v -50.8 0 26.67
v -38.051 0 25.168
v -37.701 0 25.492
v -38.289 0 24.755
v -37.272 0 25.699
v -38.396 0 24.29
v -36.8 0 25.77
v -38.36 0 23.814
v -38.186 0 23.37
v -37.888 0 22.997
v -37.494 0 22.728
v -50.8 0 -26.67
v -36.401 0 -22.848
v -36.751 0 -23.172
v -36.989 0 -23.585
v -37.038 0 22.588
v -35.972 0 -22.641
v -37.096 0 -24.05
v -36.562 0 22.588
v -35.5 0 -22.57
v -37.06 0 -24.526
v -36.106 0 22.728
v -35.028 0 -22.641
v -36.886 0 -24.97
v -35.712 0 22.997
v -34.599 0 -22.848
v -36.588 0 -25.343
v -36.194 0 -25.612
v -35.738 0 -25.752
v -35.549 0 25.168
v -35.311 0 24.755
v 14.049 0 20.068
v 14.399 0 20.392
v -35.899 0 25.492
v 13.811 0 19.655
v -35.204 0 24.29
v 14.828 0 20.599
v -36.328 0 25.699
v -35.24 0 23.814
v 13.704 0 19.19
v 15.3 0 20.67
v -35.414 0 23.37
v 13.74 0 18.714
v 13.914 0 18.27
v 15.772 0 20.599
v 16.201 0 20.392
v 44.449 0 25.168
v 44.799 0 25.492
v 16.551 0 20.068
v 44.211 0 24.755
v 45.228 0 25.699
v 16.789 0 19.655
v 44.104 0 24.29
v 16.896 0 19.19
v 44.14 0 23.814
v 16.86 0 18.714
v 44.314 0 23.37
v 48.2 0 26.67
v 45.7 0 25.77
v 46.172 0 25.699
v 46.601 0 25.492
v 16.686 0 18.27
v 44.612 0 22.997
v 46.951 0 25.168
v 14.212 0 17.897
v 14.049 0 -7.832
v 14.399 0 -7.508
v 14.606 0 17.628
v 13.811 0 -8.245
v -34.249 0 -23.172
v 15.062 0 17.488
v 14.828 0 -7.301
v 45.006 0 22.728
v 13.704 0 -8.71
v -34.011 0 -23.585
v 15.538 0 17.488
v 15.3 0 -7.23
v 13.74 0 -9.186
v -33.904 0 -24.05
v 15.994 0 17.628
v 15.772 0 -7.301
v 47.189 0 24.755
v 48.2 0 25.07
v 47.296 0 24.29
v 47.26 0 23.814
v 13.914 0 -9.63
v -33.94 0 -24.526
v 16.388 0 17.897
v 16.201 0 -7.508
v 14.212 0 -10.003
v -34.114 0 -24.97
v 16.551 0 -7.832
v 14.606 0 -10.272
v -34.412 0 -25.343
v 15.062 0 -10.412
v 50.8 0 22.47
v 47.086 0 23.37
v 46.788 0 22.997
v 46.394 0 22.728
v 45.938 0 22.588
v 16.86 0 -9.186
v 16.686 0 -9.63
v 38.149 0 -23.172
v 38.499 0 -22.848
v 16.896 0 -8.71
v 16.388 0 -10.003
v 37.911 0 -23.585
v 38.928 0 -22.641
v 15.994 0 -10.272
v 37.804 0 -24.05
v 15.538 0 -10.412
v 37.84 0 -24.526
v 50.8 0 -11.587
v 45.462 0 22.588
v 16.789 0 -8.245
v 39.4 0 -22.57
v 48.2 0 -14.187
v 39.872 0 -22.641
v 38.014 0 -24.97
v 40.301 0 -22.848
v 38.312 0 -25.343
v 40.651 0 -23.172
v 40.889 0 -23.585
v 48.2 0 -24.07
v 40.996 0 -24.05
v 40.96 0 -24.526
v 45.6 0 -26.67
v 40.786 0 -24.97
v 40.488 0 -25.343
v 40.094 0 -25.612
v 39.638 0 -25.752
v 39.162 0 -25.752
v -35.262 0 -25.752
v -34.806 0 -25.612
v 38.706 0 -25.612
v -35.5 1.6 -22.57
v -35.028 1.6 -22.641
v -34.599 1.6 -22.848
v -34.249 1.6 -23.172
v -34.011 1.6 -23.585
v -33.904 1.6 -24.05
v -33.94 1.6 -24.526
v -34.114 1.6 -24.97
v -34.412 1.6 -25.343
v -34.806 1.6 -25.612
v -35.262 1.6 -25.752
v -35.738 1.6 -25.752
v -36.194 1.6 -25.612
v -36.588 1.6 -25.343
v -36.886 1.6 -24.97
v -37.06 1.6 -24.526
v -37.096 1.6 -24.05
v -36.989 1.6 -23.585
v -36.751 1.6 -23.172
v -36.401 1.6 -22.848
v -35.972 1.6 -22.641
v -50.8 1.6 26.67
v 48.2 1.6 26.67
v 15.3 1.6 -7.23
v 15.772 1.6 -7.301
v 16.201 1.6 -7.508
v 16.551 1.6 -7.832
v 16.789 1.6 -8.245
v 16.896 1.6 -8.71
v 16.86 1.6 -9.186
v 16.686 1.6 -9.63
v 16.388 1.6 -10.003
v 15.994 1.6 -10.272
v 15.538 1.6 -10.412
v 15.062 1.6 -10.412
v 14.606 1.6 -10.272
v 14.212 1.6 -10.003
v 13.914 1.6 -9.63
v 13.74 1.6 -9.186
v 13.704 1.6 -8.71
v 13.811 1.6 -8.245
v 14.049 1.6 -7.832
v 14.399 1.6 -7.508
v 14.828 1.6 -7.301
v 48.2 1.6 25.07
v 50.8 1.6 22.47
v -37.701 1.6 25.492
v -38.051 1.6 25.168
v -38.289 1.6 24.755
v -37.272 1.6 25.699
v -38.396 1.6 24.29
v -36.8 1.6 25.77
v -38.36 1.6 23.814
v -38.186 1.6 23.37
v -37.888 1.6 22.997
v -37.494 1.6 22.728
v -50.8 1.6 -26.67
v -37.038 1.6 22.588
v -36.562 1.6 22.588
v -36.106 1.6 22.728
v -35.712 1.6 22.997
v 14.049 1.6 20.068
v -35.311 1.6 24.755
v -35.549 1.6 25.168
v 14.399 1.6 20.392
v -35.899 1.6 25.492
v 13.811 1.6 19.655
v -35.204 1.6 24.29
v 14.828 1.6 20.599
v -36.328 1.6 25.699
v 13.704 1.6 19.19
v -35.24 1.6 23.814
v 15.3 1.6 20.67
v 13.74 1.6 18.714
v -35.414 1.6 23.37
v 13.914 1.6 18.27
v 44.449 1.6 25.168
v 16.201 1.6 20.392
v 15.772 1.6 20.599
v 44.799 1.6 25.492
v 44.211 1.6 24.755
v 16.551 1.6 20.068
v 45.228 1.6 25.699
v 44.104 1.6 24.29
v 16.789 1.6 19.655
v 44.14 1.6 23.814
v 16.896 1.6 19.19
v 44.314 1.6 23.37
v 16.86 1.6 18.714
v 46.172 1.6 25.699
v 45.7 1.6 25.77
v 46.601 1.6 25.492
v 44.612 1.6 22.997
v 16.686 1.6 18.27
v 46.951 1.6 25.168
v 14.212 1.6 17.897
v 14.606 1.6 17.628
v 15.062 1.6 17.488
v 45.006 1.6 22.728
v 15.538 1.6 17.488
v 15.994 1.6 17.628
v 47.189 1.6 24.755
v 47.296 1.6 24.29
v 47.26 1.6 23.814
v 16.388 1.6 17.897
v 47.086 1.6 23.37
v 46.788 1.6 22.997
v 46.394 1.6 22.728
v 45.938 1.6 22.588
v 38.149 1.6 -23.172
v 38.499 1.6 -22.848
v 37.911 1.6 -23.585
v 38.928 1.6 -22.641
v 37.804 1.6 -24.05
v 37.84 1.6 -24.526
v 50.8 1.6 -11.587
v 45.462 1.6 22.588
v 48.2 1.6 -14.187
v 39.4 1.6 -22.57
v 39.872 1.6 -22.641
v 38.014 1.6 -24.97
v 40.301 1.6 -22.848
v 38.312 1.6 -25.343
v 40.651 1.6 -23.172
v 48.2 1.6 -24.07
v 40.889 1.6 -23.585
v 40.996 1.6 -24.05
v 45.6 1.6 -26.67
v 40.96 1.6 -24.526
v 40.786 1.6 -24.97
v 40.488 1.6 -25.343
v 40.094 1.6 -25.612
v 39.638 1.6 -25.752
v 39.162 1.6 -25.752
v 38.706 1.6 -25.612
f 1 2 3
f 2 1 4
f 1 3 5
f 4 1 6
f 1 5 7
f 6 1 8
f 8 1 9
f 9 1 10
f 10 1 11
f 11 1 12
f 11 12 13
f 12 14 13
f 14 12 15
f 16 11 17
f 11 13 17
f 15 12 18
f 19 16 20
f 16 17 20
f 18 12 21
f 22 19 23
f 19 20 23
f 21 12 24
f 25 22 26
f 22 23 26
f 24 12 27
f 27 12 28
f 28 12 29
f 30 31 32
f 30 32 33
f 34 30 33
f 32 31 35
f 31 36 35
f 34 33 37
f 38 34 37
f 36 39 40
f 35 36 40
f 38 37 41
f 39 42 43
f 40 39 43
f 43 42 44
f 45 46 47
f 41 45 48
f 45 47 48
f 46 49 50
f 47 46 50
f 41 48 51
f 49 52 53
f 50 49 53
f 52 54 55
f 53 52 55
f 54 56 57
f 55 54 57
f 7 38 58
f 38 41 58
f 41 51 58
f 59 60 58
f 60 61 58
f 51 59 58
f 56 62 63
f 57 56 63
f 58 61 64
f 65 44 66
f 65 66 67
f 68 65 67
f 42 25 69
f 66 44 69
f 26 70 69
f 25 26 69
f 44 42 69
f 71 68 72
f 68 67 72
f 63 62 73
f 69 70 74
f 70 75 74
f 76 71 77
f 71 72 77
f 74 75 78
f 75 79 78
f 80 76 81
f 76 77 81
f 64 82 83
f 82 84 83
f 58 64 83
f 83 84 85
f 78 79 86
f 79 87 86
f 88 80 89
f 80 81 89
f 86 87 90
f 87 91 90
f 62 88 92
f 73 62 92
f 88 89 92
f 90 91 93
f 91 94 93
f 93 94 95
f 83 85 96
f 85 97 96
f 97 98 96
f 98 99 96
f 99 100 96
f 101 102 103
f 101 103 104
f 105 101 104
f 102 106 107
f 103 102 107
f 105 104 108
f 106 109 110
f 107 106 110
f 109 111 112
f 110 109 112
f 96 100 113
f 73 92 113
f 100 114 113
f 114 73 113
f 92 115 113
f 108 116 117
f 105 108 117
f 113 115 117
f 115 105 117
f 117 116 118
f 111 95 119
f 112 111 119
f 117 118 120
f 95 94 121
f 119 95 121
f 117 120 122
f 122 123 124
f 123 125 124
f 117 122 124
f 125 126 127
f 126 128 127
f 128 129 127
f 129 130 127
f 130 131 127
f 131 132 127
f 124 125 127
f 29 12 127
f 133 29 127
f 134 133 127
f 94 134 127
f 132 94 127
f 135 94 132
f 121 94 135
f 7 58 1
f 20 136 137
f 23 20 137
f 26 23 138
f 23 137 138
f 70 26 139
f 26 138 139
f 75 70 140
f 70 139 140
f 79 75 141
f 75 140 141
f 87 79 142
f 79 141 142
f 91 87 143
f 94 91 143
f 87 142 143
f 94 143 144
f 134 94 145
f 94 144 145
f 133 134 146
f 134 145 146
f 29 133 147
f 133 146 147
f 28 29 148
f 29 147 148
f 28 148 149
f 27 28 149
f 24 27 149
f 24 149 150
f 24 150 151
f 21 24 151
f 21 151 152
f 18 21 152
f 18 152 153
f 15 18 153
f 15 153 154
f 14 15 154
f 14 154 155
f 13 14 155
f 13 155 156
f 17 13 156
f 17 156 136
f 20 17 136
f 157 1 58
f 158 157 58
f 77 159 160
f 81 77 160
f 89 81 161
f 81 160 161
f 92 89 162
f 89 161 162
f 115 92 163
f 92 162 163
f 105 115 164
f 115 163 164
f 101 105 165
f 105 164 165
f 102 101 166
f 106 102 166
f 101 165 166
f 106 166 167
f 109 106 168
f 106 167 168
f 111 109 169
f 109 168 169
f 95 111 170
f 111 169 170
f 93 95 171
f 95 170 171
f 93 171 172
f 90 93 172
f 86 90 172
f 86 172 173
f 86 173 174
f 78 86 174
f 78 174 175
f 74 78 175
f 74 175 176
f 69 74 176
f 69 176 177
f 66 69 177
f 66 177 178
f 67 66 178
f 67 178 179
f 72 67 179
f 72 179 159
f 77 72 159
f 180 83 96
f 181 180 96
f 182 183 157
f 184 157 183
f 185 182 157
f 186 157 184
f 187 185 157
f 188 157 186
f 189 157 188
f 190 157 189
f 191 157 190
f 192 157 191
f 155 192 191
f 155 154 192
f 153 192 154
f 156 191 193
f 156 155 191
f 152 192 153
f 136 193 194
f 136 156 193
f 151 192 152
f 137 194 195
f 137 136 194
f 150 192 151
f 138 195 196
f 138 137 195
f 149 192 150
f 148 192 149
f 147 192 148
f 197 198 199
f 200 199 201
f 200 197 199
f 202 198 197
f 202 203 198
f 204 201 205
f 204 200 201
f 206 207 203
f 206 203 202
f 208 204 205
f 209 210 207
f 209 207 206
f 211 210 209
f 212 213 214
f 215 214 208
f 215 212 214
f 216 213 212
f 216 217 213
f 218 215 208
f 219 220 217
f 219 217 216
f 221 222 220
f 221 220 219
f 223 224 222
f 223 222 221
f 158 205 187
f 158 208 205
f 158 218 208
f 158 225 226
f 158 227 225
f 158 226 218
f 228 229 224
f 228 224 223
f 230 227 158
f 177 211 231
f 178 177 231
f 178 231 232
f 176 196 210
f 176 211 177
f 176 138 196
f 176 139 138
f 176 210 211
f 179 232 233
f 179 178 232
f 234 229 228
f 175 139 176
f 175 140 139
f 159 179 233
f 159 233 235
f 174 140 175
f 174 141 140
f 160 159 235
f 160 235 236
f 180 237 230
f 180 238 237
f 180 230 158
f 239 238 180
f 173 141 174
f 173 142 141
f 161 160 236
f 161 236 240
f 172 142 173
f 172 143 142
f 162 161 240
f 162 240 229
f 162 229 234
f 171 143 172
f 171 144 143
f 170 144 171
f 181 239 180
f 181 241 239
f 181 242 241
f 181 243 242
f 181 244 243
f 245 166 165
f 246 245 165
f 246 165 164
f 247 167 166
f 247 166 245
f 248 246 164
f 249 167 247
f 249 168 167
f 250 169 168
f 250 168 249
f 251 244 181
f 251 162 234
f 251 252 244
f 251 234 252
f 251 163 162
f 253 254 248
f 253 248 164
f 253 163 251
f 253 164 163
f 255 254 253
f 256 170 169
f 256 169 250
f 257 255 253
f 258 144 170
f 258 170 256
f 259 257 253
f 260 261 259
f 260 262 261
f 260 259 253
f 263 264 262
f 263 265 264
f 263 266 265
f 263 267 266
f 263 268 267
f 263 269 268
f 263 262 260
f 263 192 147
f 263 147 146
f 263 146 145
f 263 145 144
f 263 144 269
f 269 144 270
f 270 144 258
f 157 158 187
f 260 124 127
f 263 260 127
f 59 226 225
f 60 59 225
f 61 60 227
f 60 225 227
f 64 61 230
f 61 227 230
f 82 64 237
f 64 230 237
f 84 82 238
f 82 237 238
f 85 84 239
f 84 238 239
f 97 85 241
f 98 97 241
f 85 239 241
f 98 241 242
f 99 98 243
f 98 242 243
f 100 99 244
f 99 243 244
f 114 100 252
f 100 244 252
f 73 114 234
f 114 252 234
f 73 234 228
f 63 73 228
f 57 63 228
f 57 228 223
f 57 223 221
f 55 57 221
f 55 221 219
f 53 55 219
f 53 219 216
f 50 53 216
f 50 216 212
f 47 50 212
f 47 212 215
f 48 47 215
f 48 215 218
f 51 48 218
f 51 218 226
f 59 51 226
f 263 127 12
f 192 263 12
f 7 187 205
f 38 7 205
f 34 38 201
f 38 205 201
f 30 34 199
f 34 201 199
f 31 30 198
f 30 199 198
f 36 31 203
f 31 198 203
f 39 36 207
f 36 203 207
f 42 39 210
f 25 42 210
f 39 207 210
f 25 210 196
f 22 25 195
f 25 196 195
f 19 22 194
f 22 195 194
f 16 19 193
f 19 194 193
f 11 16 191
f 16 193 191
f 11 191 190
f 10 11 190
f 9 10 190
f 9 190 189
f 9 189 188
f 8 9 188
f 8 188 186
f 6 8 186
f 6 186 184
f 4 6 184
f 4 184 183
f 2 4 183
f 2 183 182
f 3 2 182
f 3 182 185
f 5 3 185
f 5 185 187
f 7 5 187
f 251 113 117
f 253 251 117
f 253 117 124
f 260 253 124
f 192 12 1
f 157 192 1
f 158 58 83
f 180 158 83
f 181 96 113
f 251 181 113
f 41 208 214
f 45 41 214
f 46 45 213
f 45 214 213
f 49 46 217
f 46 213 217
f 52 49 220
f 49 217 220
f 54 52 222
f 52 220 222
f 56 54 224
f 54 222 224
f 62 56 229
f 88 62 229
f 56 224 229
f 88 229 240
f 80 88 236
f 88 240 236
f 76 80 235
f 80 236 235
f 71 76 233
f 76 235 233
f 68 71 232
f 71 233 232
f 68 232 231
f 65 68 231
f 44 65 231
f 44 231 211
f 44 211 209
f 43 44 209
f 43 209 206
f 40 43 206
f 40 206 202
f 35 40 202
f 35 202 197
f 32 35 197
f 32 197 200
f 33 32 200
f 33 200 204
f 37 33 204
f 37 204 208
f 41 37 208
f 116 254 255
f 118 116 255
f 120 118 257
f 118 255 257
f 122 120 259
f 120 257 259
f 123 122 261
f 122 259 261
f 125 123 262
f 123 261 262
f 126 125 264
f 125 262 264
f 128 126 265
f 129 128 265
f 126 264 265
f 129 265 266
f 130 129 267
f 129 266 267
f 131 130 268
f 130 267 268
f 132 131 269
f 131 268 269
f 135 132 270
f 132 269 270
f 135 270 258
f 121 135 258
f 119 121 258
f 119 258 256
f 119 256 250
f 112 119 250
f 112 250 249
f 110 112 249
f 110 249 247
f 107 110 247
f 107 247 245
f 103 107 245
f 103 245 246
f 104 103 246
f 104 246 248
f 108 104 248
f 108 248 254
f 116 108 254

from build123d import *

# Parameters (mm, degrees)
BOSS_EXTRUDE1_DEPTH   = 1.6
ESBO_O1_R             = 1.6
CORTE_EXTRUS_O1_DEPTH = 10


with BuildPart() as part:
    # Sketch2 → Boss-Extrude1 (new body)
    with BuildSketch(Plane(origin=(0, 0, 0), x_dir=(1, 0, 0), z_dir=(0, 1, 0))):
        Polygon((50.8, -22.47), (50.8, 11.586871141), (48.2, 14.186871141), (48.2, 24.07), (45.6, 26.67), (-50.8, 26.67), (-50.8, -26.67), (48.2, -26.67), (48.2, -25.07), align=None)
    extrude(amount=BOSS_EXTRUDE1_DEPTH)

    # Esboço1 → Corte-extrusão1 (cut)
    with BuildSketch(Plane(origin=(0, 1.6, 0), x_dir=(1, 0, 0), z_dir=(0, 1, 0))):
        with Locations(Location((-35.5, 24.17, 0), (0, 0, 270))):
            Circle(ESBO_O1_R)
        with Locations(Location((-36.8, -24.17, 0), (0, 0, 270))):
            Circle(ESBO_O1_R)
        with Locations(Location((39.4, 24.17, 0), (0, 0, 270))):
            Circle(ESBO_O1_R)
        with Locations(Location((45.7, -24.17, 0), (0, 0, 270))):
            Circle(ESBO_O1_R)
        with Locations(Location((15.3, 8.83, 0), (0, 0, 270))):
            Circle(ESBO_O1_R)
        with Locations(Location((15.3, -19.07, 0), (0, 0, 270))):
            Circle(ESBO_O1_R)
    extrude(amount=-CORTE_EXTRUS_O1_DEPTH, mode=Mode.SUBTRACT)


solid = part.part
